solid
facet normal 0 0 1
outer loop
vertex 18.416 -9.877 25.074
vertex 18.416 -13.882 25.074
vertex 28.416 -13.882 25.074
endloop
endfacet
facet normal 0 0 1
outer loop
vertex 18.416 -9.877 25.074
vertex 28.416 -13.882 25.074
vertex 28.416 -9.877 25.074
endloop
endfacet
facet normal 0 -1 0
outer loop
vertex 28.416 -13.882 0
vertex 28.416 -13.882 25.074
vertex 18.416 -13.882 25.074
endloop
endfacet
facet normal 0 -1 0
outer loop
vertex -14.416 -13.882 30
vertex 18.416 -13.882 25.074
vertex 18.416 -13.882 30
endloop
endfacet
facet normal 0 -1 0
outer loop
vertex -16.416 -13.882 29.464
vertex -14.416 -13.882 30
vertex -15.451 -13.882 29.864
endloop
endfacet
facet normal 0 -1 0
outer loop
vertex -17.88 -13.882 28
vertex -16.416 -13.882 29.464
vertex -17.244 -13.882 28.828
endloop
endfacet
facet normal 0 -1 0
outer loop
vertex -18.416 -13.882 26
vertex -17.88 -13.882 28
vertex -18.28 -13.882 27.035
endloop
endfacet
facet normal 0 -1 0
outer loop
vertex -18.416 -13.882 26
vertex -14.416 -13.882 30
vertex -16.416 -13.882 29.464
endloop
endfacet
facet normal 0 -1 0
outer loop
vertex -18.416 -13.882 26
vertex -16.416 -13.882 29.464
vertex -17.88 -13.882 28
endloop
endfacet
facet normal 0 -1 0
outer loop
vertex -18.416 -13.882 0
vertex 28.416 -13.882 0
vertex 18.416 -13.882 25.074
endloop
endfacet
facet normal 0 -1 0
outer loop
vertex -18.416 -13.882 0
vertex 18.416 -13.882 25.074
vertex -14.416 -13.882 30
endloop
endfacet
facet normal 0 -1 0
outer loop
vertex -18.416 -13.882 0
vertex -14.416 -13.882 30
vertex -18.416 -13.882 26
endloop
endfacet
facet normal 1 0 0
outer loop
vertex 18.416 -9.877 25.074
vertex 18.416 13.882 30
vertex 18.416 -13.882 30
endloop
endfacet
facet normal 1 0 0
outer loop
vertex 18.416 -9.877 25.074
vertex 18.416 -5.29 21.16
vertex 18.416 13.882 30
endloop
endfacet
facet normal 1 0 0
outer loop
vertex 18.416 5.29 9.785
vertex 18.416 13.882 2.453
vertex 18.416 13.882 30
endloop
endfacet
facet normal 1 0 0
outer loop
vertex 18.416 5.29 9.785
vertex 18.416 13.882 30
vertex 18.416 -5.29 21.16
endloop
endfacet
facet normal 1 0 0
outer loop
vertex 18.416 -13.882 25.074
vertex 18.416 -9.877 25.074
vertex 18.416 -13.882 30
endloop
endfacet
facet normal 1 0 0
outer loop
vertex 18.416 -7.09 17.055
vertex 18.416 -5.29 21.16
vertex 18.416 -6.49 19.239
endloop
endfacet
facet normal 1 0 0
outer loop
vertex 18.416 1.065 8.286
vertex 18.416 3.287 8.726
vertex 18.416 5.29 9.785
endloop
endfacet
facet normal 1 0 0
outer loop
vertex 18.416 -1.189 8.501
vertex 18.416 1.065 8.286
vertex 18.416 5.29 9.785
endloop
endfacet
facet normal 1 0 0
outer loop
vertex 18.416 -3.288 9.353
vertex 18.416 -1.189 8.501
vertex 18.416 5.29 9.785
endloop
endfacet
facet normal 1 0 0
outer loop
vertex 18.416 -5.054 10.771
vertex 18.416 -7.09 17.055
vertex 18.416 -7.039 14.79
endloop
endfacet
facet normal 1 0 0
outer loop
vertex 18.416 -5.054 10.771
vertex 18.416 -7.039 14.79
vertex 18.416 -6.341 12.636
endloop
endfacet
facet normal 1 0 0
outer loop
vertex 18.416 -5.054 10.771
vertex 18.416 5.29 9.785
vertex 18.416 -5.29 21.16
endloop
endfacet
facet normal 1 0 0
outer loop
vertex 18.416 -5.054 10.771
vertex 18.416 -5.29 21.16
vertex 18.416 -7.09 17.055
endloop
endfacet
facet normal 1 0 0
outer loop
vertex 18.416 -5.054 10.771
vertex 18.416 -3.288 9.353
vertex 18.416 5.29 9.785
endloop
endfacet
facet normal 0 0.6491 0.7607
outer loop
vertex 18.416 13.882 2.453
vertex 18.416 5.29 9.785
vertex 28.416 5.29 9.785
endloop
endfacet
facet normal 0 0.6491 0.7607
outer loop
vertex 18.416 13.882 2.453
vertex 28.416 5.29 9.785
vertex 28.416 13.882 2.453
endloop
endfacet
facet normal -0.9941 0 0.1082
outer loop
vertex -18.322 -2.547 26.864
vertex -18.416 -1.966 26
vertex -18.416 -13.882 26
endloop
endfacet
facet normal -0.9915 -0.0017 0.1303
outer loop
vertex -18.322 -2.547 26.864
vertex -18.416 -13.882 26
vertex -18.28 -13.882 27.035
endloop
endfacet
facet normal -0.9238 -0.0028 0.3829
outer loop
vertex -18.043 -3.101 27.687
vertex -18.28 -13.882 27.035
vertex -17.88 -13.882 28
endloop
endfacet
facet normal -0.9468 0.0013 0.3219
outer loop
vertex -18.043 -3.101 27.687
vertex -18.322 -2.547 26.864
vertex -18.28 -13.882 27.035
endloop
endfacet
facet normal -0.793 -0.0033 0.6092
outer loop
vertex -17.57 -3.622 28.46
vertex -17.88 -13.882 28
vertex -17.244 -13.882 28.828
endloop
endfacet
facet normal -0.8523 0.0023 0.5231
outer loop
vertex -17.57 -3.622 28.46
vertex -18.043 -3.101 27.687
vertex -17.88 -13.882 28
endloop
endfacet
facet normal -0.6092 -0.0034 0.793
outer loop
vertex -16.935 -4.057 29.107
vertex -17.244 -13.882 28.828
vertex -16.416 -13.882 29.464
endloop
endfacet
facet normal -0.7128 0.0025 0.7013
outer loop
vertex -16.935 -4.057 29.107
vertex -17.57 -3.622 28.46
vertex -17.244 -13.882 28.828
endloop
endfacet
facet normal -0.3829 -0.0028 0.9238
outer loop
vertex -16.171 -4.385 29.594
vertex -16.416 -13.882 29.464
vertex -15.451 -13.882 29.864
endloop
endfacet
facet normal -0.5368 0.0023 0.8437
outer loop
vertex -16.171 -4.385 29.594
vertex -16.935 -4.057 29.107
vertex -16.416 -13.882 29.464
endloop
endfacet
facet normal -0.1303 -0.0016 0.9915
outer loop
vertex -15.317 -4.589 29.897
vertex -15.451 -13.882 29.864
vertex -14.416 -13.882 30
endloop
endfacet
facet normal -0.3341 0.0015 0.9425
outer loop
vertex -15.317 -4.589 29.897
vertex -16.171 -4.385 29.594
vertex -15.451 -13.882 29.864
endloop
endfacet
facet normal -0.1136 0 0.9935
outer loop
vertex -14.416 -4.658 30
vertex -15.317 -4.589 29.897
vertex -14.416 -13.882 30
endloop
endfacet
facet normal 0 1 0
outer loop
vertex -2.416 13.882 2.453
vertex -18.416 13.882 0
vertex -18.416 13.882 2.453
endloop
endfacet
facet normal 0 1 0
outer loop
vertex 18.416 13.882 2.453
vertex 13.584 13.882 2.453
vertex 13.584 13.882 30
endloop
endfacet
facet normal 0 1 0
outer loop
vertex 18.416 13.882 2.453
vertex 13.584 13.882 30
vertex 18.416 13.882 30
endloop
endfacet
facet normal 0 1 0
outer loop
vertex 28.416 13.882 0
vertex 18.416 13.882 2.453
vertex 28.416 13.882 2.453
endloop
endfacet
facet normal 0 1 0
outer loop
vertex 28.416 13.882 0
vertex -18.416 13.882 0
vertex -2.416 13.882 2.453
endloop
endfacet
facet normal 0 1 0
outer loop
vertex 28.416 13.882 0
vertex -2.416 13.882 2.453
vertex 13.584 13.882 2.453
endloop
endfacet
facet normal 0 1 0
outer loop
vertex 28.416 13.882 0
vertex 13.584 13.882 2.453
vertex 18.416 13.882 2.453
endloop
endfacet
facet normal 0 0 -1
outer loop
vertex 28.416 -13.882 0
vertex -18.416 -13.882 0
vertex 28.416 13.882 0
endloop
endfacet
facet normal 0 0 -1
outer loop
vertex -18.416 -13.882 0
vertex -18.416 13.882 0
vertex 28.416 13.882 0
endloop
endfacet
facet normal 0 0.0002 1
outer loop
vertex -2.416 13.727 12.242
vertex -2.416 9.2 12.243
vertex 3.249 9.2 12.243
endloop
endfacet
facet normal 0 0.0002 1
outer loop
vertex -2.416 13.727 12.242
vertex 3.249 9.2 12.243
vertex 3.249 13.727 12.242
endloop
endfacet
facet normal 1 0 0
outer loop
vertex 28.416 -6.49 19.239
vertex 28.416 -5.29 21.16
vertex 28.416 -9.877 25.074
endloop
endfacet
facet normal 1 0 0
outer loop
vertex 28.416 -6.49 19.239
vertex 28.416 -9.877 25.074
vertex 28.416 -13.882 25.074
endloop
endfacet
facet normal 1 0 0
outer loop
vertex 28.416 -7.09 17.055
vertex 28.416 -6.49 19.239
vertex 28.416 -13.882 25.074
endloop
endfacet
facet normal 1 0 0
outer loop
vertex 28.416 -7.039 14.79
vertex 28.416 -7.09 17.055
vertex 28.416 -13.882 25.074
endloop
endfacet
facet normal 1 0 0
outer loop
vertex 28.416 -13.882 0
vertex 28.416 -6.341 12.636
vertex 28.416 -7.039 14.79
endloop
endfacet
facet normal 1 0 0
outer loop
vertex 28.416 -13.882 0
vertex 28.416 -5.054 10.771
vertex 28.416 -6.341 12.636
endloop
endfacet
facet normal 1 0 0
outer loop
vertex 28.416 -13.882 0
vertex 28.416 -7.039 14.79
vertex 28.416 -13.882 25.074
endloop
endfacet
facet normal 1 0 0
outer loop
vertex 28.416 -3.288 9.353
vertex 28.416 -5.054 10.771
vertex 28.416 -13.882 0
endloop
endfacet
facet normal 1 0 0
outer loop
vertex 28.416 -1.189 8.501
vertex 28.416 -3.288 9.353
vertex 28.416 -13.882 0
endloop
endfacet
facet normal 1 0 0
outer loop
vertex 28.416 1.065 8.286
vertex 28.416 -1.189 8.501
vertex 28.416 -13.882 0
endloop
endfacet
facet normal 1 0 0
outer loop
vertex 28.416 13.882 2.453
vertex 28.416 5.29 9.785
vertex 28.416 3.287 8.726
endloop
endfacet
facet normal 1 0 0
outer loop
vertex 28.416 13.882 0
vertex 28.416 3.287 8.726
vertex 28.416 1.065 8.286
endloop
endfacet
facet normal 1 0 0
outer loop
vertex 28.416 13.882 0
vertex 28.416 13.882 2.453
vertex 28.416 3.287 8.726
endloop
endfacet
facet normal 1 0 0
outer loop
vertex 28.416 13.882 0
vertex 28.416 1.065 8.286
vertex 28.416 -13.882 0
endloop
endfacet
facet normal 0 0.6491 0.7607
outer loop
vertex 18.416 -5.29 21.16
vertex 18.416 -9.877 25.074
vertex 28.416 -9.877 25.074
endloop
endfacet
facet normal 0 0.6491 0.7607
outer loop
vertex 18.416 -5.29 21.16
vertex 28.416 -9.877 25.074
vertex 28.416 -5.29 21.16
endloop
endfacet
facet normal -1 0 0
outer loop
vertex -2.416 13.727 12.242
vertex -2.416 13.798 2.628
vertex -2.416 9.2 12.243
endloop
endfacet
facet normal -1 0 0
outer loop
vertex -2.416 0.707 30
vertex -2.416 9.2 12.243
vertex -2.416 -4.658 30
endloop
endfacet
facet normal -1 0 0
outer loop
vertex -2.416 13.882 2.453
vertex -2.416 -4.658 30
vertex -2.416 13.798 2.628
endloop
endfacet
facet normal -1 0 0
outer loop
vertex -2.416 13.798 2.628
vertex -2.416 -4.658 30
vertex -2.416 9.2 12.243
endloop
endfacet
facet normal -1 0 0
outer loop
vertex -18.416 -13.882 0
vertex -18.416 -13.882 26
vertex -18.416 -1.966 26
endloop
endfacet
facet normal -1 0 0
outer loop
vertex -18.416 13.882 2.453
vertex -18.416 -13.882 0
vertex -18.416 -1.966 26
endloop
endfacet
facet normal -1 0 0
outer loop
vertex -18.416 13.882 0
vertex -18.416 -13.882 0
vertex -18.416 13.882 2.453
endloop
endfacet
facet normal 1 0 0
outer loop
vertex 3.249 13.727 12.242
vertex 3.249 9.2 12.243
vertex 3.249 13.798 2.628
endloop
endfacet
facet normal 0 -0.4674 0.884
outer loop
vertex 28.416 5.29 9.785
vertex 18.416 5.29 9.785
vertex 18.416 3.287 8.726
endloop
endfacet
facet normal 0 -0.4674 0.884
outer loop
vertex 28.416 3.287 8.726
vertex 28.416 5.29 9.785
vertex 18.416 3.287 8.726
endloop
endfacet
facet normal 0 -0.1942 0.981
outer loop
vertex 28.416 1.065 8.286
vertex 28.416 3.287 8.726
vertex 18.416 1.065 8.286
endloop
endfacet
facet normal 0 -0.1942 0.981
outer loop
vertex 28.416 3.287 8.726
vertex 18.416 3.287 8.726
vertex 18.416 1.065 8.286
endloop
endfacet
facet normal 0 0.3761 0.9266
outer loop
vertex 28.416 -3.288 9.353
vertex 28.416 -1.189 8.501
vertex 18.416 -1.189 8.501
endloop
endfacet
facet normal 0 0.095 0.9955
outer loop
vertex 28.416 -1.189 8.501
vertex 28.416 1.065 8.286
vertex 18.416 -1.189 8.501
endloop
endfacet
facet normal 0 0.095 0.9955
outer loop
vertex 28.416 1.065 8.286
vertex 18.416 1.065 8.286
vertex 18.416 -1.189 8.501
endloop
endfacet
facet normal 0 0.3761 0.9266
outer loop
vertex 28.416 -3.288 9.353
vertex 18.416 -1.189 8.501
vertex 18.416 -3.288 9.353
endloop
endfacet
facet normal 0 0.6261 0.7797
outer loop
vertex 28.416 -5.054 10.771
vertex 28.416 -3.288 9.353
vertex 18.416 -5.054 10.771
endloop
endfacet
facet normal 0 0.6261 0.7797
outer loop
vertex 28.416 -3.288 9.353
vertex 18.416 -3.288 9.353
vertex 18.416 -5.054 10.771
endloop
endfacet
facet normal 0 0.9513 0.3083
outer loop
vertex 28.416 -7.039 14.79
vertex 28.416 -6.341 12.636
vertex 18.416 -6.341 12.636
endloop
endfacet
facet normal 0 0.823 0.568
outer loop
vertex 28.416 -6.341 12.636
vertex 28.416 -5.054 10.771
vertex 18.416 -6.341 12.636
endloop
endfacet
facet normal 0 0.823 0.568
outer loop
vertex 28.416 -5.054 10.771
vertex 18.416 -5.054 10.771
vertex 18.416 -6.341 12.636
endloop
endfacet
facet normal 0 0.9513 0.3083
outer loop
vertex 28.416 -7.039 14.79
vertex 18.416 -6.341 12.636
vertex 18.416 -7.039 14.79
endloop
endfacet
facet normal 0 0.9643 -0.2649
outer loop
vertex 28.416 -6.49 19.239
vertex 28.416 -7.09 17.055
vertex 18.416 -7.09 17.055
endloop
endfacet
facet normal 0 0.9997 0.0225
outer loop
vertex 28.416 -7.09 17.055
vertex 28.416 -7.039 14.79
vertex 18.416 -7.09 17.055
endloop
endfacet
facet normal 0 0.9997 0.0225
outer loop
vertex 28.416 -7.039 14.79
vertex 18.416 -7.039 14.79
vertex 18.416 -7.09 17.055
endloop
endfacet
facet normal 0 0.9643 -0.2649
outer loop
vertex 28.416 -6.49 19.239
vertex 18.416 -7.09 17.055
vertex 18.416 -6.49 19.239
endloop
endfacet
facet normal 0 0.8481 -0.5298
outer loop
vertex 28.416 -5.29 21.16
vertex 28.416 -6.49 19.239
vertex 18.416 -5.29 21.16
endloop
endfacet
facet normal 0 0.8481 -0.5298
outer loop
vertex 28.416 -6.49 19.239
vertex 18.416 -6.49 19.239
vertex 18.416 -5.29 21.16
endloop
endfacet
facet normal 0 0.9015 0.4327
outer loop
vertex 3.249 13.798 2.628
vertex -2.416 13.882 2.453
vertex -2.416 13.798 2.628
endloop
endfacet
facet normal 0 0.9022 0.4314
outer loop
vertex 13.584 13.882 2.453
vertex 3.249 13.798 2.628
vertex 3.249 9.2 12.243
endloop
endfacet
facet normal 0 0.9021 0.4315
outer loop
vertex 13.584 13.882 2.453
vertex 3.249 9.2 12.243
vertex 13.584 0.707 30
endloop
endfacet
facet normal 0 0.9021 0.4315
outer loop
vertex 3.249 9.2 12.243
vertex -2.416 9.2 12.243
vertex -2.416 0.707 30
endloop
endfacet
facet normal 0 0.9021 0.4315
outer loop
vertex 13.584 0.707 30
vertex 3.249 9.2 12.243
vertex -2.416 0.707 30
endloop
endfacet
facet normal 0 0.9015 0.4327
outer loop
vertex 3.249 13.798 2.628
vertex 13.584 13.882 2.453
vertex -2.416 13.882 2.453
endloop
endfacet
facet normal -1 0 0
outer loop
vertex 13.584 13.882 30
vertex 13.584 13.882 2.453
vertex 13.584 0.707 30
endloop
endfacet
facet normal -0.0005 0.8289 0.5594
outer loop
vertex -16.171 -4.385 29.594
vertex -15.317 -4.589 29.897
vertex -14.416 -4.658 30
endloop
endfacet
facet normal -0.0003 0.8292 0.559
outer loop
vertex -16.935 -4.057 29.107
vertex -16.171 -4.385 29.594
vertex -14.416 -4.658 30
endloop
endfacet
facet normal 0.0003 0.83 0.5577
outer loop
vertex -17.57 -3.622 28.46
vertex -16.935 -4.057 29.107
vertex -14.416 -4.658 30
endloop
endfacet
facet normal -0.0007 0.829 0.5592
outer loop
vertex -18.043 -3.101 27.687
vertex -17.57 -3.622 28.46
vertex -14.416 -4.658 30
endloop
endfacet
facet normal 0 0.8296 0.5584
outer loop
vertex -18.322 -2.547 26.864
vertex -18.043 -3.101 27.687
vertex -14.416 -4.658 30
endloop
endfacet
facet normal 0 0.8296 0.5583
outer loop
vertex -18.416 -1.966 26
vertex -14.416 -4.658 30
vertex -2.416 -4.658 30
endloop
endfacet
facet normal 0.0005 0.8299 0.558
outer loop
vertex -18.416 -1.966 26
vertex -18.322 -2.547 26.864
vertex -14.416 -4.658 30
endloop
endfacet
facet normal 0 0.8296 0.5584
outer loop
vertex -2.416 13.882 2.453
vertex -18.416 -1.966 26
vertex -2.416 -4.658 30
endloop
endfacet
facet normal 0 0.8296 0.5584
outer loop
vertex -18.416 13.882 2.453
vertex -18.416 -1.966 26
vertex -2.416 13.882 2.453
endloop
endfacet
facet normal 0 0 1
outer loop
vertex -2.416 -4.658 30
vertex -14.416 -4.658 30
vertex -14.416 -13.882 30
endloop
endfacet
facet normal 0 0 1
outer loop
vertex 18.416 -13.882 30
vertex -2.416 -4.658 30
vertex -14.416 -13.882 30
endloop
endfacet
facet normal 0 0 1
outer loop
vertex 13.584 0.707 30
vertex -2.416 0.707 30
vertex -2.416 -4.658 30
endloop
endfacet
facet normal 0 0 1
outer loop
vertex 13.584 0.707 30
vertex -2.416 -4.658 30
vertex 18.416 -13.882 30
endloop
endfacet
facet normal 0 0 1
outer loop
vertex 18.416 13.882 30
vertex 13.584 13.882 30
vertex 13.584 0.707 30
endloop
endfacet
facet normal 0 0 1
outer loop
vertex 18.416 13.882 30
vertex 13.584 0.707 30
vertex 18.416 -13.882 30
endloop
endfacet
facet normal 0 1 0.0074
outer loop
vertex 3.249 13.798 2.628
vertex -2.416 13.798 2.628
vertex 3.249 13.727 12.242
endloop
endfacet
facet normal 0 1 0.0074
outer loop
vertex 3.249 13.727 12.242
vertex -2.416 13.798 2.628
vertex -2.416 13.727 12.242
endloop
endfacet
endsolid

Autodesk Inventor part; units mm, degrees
ref_plane "YZ Plane" through (0, 0, 0) normal (1, 0, 0) x (0, 1, 0)
ref_plane "XZ Plane" through (0, 0, 0) normal (0, 1, 0) x (-1, 0, 0)
ref_plane "XY Plane" through (0, 0, 0) normal (0, 0, 1) x (1, 0, 0)
sketch "스케치1" plane through (0, 0, 0) normal (0, 0, 1) x (1, 0, 0)
  line L0 (18.416, -13.8824) -> (-18.416, -13.8824)
  line L1 (-18.416, -13.8824) -> (-18.416, 13.8824)
  line L2 (-18.416, 13.8824) -> (18.416, 13.8824)
  line L3 (18.416, 13.8824) -> (18.416, -13.8824)
  line L4 (18.416, -13.8824) -> (-18.416, 13.8824) construction
  line L5 (-18.416, -13.8824) -> (18.416, 13.8824) construction
  point P0 (0, 0)
extrude "돌출1" add sketch "스케치1" along normal blind 30
sketch "스케치2" plane through (18.416, -13.8824, 0) normal (1, 0, 0) x (0, 0, -1)
  line L0 (0, 27.7648) -> (0, 0) projected
  line L1 (0, 0) -> (-30, 0) projected
  line L2 (-25.0736, 0) -> (-25.0736, 4.0058)
  line L3 (-25.0736, 4.0058) -> (-21.1597, 8.5925)
  arc A0 (-21.1597, 8.5925) -> (-9.7848, 19.1723) centre (-16.0979, 14.5551) ccw
  line L4 (-9.7848, 19.1723) -> (-2.4526, 27.7648)
  line L5 (0, 27.7648) -> (-30, 27.7648) projected
  line L6 (0, 27.7648) -> (0, 0)
  point P0 (0, 13.8824)
extrude "돌출2" add sketch "스케치2" along normal blind 10
sketch "스케치3" plane through (-18.416, -13.8824, 0) normal (-1, 0, 0) x (0, 0, 1)
  line L0 (9.7848, 19.1723) -> (2.4526, 27.7648) projected
  line L1 (0, 27.7648) -> (30, 27.7648) projected
  line L2 (2.4526, 27.7648) -> (0, 27.7648)
  line L3 (0, 27.7648) -> (0, 6.044)
  line L4 (0, 0) -> (0, 27.7648) projected
  line L5 (30, 9.2244) -> (2.4526, 27.7648)
  line L6 (30, 9.2244) -> (30, 27.7648)
  point P0 (0, 13.8824)
extrude "돌출3" cut sketch "스케치3" against normal blind 16
sketch "스케치4" plane through (-2.416, -13.8824, 0) normal (-1, 0, 0) x (0, 0, 1)
  line L0 (2.4526, 27.7648) -> (30, 27.7648) projected
  line L1 (2.4526, 27.7648) -> (30, 14.5898)
  line L2 (30, 27.7648) -> (30, 9.2244) projected
  line L3 (30, 27.7648) -> (2.4526, 27.7648)
  point P0 (0, 13.8824)
extrude "돌출4" cut sketch "스케치4" against normal blind 16
sketch "스케치5" plane through (-2.416, 0.7074, 30) normal (0, 0.9021329, 0.4314583) x (1, 0, 0)
  line L0 (0, -2.315) -> (0, 30.5359) projected
  line L1 (5.6646, 30.341) -> (0, 30.341)
  line L2 (0, 30.341) -> (0, 19.6839)
  line L3 (0, 19.6839) -> (5.6646, 19.6839)
  line L4 (5.6646, 19.6839) -> (5.6646, 30.341)
  point P0 (2.416, 26.7588)
extrude "돌출5" add sketch "스케치5" along normal blind 5
sketch "스케치6" plane through (-2.416, -13.8824, 0) normal (-1, 0, 0) x (0, 0, 1)
  line L0 (30, 14.5898) -> (2.4526, 27.7648) projected
  line L1 (12.2425, 23.0826) -> (14.3998, 27.5933) projected
  line L2 (2.6284, 27.6807) -> (14.3998, 27.5933)
  line L3 (4.7857, 32.1914) -> (14.3998, 27.5933) projected
  line L4 (14.3998, 27.5933) -> (4.7857, 32.1914)
  line L5 (4.7857, 32.1914) -> (2.6284, 27.6807)
  point P0 (0, 13.8824)
extrude "돌출6" cut sketch "스케치6" against normal blind 9 contours L5 L3 L2
sketch "스케치7" plane through (-2.416, -13.8824, 0) normal (-1, 0, 0) x (0, 0, 1)
  line L0 (12.2425, 23.0826) -> (14.3998, 27.5933) projected
  line L1 (14.3998, 27.5933) -> (12.2425, 23.0826)
  line L2 (12.2425, 23.0826) -> (12.2425, 27.6093)
  line L3 (14.3998, 27.5933) -> (2.6284, 27.6807) projected
  point P0 (0, 13.8824)
extrude "돌출7" cut sketch "스케치7" against normal blind 9
fillet "모깎기1" radius 4 1 edges at (-18.416, -9.2702, 30)
properties part number "240516_3Dsketch01"
